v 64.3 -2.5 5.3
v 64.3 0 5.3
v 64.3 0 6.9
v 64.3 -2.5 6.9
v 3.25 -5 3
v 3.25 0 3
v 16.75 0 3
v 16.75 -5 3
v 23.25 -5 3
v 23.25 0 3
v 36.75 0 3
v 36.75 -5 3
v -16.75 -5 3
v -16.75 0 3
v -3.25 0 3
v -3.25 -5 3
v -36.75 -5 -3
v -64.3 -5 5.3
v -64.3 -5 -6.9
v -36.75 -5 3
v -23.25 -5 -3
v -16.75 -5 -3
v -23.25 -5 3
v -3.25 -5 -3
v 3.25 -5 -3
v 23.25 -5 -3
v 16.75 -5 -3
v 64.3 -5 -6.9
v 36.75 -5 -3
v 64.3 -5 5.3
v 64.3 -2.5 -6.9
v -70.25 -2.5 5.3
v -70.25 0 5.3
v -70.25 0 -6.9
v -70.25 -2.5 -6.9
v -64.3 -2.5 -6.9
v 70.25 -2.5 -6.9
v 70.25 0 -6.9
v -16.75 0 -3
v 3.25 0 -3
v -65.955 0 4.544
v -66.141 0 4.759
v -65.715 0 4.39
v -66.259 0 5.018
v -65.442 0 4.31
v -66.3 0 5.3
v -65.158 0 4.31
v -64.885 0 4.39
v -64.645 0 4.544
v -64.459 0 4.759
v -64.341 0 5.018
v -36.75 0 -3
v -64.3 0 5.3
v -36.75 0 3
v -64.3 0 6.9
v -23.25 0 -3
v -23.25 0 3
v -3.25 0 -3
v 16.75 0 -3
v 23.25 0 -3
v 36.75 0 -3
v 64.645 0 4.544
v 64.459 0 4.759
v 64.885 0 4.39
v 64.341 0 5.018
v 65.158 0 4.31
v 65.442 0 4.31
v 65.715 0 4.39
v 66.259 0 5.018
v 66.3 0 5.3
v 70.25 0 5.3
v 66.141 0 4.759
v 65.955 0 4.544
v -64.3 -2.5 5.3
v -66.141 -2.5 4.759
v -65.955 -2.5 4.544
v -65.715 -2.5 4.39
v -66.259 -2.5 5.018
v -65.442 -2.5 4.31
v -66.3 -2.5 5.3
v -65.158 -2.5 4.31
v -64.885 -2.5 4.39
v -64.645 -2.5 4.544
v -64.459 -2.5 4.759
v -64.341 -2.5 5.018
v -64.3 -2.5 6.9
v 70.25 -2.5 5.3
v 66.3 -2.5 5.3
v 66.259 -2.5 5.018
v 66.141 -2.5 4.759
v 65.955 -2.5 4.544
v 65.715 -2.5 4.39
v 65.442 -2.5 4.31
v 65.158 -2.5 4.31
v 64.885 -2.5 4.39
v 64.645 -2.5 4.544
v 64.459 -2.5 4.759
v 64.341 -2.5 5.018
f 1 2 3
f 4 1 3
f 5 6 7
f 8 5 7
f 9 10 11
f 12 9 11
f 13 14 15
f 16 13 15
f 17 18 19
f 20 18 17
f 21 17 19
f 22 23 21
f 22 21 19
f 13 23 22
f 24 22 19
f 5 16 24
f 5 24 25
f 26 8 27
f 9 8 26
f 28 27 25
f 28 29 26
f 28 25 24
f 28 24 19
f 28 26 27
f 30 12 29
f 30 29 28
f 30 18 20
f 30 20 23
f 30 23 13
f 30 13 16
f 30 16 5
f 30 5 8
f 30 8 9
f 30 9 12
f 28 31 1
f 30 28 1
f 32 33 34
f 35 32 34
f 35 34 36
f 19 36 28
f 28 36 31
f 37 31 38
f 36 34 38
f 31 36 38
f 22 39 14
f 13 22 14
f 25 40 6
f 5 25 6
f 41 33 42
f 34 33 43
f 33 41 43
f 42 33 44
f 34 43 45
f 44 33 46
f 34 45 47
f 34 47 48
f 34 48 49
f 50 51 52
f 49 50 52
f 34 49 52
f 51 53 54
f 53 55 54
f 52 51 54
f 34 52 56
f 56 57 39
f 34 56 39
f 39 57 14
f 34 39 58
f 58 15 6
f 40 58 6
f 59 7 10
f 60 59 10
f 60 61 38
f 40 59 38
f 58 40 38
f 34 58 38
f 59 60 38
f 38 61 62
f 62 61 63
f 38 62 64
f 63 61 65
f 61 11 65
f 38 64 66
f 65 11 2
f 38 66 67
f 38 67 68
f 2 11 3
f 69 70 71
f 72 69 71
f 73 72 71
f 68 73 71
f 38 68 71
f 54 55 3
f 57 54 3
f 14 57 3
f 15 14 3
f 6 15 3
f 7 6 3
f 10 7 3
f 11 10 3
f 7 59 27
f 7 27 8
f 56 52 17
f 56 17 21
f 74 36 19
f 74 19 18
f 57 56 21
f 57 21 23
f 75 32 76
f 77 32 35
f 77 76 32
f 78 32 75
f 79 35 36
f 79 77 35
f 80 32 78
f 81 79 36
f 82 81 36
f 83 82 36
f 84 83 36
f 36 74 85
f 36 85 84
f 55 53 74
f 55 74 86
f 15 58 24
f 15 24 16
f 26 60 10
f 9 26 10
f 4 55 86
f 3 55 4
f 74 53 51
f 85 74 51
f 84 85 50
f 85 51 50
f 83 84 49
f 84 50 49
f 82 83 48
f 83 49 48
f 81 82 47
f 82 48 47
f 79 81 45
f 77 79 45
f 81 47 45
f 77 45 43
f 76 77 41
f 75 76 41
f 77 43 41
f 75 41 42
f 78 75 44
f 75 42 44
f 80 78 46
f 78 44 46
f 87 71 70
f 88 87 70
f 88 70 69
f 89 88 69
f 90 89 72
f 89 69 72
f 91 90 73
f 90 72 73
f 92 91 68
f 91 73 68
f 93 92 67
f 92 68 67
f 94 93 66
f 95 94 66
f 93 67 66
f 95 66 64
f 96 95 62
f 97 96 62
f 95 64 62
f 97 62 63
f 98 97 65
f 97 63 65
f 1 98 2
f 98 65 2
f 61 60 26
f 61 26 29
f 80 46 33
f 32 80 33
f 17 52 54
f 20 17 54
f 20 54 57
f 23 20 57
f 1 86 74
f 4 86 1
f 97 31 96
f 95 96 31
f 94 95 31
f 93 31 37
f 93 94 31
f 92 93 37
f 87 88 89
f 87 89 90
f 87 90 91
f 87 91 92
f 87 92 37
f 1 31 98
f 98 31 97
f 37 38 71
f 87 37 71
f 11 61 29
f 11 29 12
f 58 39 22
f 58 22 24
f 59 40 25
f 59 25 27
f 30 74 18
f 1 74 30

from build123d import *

# Parameters (mm, degrees)
F0_W     = 128.6
F0_H     = 12.2
F0_W_2   = 13.5
F0_H_2   = 6
F1_DEPTH = 5
F0_H_3   = 1.6
F2_DEPTH = 2.5


with BuildPart() as f1:
    # F0 (on Front) → F1 (new body)
    with BuildSketch(Plane.XZ):
        with Locations((0, -0.8)):
            Rectangle(F0_W, F0_H)
        with Locations((-30, 0)):
            Rectangle(F0_W_2, F0_H_2, mode=Mode.SUBTRACT)
        with Locations((-10, 0)):
            Rectangle(F0_W_2, F0_H_2, mode=Mode.SUBTRACT)
        with Locations((10, 0)):
            Rectangle(F0_W_2, F0_H_2, mode=Mode.SUBTRACT)
        with Locations((30, 0)):
            Rectangle(F0_W_2, F0_H_2, mode=Mode.SUBTRACT)
    extrude(amount=F1_DEPTH)

    # F0 (on Front) → F2 (join)
    with BuildSketch(Plane.XZ):
        with BuildLine():
            Line((-64.3, -6.9), (-64.3, 5.3))
            ThreePointArc((-64.3, 5.3), (-65.3, 4.3), (-66.3, 5.3))
            Line((-66.3, 5.3), (-70.25, 5.3))
            Line((-70.25, 5.3), (-70.25, -6.9))
            Line((-70.25, -6.9), (-64.3, -6.9))
        make_face()
        with Locations((0, 6.1)):
            Rectangle(F0_W, F0_H_3)
        with BuildLine():
            ThreePointArc((66.3, 5.3), (65.3, 4.3), (64.3, 5.3))
            Line((64.3, 5.3), (64.3, -6.9))
            Line((64.3, -6.9), (70.25, -6.9))
            Line((70.25, -6.9), (70.25, 5.3))
            Line((70.25, 5.3), (66.3, 5.3))
        make_face()
    extrude(amount=F2_DEPTH)


solid = f1.part
